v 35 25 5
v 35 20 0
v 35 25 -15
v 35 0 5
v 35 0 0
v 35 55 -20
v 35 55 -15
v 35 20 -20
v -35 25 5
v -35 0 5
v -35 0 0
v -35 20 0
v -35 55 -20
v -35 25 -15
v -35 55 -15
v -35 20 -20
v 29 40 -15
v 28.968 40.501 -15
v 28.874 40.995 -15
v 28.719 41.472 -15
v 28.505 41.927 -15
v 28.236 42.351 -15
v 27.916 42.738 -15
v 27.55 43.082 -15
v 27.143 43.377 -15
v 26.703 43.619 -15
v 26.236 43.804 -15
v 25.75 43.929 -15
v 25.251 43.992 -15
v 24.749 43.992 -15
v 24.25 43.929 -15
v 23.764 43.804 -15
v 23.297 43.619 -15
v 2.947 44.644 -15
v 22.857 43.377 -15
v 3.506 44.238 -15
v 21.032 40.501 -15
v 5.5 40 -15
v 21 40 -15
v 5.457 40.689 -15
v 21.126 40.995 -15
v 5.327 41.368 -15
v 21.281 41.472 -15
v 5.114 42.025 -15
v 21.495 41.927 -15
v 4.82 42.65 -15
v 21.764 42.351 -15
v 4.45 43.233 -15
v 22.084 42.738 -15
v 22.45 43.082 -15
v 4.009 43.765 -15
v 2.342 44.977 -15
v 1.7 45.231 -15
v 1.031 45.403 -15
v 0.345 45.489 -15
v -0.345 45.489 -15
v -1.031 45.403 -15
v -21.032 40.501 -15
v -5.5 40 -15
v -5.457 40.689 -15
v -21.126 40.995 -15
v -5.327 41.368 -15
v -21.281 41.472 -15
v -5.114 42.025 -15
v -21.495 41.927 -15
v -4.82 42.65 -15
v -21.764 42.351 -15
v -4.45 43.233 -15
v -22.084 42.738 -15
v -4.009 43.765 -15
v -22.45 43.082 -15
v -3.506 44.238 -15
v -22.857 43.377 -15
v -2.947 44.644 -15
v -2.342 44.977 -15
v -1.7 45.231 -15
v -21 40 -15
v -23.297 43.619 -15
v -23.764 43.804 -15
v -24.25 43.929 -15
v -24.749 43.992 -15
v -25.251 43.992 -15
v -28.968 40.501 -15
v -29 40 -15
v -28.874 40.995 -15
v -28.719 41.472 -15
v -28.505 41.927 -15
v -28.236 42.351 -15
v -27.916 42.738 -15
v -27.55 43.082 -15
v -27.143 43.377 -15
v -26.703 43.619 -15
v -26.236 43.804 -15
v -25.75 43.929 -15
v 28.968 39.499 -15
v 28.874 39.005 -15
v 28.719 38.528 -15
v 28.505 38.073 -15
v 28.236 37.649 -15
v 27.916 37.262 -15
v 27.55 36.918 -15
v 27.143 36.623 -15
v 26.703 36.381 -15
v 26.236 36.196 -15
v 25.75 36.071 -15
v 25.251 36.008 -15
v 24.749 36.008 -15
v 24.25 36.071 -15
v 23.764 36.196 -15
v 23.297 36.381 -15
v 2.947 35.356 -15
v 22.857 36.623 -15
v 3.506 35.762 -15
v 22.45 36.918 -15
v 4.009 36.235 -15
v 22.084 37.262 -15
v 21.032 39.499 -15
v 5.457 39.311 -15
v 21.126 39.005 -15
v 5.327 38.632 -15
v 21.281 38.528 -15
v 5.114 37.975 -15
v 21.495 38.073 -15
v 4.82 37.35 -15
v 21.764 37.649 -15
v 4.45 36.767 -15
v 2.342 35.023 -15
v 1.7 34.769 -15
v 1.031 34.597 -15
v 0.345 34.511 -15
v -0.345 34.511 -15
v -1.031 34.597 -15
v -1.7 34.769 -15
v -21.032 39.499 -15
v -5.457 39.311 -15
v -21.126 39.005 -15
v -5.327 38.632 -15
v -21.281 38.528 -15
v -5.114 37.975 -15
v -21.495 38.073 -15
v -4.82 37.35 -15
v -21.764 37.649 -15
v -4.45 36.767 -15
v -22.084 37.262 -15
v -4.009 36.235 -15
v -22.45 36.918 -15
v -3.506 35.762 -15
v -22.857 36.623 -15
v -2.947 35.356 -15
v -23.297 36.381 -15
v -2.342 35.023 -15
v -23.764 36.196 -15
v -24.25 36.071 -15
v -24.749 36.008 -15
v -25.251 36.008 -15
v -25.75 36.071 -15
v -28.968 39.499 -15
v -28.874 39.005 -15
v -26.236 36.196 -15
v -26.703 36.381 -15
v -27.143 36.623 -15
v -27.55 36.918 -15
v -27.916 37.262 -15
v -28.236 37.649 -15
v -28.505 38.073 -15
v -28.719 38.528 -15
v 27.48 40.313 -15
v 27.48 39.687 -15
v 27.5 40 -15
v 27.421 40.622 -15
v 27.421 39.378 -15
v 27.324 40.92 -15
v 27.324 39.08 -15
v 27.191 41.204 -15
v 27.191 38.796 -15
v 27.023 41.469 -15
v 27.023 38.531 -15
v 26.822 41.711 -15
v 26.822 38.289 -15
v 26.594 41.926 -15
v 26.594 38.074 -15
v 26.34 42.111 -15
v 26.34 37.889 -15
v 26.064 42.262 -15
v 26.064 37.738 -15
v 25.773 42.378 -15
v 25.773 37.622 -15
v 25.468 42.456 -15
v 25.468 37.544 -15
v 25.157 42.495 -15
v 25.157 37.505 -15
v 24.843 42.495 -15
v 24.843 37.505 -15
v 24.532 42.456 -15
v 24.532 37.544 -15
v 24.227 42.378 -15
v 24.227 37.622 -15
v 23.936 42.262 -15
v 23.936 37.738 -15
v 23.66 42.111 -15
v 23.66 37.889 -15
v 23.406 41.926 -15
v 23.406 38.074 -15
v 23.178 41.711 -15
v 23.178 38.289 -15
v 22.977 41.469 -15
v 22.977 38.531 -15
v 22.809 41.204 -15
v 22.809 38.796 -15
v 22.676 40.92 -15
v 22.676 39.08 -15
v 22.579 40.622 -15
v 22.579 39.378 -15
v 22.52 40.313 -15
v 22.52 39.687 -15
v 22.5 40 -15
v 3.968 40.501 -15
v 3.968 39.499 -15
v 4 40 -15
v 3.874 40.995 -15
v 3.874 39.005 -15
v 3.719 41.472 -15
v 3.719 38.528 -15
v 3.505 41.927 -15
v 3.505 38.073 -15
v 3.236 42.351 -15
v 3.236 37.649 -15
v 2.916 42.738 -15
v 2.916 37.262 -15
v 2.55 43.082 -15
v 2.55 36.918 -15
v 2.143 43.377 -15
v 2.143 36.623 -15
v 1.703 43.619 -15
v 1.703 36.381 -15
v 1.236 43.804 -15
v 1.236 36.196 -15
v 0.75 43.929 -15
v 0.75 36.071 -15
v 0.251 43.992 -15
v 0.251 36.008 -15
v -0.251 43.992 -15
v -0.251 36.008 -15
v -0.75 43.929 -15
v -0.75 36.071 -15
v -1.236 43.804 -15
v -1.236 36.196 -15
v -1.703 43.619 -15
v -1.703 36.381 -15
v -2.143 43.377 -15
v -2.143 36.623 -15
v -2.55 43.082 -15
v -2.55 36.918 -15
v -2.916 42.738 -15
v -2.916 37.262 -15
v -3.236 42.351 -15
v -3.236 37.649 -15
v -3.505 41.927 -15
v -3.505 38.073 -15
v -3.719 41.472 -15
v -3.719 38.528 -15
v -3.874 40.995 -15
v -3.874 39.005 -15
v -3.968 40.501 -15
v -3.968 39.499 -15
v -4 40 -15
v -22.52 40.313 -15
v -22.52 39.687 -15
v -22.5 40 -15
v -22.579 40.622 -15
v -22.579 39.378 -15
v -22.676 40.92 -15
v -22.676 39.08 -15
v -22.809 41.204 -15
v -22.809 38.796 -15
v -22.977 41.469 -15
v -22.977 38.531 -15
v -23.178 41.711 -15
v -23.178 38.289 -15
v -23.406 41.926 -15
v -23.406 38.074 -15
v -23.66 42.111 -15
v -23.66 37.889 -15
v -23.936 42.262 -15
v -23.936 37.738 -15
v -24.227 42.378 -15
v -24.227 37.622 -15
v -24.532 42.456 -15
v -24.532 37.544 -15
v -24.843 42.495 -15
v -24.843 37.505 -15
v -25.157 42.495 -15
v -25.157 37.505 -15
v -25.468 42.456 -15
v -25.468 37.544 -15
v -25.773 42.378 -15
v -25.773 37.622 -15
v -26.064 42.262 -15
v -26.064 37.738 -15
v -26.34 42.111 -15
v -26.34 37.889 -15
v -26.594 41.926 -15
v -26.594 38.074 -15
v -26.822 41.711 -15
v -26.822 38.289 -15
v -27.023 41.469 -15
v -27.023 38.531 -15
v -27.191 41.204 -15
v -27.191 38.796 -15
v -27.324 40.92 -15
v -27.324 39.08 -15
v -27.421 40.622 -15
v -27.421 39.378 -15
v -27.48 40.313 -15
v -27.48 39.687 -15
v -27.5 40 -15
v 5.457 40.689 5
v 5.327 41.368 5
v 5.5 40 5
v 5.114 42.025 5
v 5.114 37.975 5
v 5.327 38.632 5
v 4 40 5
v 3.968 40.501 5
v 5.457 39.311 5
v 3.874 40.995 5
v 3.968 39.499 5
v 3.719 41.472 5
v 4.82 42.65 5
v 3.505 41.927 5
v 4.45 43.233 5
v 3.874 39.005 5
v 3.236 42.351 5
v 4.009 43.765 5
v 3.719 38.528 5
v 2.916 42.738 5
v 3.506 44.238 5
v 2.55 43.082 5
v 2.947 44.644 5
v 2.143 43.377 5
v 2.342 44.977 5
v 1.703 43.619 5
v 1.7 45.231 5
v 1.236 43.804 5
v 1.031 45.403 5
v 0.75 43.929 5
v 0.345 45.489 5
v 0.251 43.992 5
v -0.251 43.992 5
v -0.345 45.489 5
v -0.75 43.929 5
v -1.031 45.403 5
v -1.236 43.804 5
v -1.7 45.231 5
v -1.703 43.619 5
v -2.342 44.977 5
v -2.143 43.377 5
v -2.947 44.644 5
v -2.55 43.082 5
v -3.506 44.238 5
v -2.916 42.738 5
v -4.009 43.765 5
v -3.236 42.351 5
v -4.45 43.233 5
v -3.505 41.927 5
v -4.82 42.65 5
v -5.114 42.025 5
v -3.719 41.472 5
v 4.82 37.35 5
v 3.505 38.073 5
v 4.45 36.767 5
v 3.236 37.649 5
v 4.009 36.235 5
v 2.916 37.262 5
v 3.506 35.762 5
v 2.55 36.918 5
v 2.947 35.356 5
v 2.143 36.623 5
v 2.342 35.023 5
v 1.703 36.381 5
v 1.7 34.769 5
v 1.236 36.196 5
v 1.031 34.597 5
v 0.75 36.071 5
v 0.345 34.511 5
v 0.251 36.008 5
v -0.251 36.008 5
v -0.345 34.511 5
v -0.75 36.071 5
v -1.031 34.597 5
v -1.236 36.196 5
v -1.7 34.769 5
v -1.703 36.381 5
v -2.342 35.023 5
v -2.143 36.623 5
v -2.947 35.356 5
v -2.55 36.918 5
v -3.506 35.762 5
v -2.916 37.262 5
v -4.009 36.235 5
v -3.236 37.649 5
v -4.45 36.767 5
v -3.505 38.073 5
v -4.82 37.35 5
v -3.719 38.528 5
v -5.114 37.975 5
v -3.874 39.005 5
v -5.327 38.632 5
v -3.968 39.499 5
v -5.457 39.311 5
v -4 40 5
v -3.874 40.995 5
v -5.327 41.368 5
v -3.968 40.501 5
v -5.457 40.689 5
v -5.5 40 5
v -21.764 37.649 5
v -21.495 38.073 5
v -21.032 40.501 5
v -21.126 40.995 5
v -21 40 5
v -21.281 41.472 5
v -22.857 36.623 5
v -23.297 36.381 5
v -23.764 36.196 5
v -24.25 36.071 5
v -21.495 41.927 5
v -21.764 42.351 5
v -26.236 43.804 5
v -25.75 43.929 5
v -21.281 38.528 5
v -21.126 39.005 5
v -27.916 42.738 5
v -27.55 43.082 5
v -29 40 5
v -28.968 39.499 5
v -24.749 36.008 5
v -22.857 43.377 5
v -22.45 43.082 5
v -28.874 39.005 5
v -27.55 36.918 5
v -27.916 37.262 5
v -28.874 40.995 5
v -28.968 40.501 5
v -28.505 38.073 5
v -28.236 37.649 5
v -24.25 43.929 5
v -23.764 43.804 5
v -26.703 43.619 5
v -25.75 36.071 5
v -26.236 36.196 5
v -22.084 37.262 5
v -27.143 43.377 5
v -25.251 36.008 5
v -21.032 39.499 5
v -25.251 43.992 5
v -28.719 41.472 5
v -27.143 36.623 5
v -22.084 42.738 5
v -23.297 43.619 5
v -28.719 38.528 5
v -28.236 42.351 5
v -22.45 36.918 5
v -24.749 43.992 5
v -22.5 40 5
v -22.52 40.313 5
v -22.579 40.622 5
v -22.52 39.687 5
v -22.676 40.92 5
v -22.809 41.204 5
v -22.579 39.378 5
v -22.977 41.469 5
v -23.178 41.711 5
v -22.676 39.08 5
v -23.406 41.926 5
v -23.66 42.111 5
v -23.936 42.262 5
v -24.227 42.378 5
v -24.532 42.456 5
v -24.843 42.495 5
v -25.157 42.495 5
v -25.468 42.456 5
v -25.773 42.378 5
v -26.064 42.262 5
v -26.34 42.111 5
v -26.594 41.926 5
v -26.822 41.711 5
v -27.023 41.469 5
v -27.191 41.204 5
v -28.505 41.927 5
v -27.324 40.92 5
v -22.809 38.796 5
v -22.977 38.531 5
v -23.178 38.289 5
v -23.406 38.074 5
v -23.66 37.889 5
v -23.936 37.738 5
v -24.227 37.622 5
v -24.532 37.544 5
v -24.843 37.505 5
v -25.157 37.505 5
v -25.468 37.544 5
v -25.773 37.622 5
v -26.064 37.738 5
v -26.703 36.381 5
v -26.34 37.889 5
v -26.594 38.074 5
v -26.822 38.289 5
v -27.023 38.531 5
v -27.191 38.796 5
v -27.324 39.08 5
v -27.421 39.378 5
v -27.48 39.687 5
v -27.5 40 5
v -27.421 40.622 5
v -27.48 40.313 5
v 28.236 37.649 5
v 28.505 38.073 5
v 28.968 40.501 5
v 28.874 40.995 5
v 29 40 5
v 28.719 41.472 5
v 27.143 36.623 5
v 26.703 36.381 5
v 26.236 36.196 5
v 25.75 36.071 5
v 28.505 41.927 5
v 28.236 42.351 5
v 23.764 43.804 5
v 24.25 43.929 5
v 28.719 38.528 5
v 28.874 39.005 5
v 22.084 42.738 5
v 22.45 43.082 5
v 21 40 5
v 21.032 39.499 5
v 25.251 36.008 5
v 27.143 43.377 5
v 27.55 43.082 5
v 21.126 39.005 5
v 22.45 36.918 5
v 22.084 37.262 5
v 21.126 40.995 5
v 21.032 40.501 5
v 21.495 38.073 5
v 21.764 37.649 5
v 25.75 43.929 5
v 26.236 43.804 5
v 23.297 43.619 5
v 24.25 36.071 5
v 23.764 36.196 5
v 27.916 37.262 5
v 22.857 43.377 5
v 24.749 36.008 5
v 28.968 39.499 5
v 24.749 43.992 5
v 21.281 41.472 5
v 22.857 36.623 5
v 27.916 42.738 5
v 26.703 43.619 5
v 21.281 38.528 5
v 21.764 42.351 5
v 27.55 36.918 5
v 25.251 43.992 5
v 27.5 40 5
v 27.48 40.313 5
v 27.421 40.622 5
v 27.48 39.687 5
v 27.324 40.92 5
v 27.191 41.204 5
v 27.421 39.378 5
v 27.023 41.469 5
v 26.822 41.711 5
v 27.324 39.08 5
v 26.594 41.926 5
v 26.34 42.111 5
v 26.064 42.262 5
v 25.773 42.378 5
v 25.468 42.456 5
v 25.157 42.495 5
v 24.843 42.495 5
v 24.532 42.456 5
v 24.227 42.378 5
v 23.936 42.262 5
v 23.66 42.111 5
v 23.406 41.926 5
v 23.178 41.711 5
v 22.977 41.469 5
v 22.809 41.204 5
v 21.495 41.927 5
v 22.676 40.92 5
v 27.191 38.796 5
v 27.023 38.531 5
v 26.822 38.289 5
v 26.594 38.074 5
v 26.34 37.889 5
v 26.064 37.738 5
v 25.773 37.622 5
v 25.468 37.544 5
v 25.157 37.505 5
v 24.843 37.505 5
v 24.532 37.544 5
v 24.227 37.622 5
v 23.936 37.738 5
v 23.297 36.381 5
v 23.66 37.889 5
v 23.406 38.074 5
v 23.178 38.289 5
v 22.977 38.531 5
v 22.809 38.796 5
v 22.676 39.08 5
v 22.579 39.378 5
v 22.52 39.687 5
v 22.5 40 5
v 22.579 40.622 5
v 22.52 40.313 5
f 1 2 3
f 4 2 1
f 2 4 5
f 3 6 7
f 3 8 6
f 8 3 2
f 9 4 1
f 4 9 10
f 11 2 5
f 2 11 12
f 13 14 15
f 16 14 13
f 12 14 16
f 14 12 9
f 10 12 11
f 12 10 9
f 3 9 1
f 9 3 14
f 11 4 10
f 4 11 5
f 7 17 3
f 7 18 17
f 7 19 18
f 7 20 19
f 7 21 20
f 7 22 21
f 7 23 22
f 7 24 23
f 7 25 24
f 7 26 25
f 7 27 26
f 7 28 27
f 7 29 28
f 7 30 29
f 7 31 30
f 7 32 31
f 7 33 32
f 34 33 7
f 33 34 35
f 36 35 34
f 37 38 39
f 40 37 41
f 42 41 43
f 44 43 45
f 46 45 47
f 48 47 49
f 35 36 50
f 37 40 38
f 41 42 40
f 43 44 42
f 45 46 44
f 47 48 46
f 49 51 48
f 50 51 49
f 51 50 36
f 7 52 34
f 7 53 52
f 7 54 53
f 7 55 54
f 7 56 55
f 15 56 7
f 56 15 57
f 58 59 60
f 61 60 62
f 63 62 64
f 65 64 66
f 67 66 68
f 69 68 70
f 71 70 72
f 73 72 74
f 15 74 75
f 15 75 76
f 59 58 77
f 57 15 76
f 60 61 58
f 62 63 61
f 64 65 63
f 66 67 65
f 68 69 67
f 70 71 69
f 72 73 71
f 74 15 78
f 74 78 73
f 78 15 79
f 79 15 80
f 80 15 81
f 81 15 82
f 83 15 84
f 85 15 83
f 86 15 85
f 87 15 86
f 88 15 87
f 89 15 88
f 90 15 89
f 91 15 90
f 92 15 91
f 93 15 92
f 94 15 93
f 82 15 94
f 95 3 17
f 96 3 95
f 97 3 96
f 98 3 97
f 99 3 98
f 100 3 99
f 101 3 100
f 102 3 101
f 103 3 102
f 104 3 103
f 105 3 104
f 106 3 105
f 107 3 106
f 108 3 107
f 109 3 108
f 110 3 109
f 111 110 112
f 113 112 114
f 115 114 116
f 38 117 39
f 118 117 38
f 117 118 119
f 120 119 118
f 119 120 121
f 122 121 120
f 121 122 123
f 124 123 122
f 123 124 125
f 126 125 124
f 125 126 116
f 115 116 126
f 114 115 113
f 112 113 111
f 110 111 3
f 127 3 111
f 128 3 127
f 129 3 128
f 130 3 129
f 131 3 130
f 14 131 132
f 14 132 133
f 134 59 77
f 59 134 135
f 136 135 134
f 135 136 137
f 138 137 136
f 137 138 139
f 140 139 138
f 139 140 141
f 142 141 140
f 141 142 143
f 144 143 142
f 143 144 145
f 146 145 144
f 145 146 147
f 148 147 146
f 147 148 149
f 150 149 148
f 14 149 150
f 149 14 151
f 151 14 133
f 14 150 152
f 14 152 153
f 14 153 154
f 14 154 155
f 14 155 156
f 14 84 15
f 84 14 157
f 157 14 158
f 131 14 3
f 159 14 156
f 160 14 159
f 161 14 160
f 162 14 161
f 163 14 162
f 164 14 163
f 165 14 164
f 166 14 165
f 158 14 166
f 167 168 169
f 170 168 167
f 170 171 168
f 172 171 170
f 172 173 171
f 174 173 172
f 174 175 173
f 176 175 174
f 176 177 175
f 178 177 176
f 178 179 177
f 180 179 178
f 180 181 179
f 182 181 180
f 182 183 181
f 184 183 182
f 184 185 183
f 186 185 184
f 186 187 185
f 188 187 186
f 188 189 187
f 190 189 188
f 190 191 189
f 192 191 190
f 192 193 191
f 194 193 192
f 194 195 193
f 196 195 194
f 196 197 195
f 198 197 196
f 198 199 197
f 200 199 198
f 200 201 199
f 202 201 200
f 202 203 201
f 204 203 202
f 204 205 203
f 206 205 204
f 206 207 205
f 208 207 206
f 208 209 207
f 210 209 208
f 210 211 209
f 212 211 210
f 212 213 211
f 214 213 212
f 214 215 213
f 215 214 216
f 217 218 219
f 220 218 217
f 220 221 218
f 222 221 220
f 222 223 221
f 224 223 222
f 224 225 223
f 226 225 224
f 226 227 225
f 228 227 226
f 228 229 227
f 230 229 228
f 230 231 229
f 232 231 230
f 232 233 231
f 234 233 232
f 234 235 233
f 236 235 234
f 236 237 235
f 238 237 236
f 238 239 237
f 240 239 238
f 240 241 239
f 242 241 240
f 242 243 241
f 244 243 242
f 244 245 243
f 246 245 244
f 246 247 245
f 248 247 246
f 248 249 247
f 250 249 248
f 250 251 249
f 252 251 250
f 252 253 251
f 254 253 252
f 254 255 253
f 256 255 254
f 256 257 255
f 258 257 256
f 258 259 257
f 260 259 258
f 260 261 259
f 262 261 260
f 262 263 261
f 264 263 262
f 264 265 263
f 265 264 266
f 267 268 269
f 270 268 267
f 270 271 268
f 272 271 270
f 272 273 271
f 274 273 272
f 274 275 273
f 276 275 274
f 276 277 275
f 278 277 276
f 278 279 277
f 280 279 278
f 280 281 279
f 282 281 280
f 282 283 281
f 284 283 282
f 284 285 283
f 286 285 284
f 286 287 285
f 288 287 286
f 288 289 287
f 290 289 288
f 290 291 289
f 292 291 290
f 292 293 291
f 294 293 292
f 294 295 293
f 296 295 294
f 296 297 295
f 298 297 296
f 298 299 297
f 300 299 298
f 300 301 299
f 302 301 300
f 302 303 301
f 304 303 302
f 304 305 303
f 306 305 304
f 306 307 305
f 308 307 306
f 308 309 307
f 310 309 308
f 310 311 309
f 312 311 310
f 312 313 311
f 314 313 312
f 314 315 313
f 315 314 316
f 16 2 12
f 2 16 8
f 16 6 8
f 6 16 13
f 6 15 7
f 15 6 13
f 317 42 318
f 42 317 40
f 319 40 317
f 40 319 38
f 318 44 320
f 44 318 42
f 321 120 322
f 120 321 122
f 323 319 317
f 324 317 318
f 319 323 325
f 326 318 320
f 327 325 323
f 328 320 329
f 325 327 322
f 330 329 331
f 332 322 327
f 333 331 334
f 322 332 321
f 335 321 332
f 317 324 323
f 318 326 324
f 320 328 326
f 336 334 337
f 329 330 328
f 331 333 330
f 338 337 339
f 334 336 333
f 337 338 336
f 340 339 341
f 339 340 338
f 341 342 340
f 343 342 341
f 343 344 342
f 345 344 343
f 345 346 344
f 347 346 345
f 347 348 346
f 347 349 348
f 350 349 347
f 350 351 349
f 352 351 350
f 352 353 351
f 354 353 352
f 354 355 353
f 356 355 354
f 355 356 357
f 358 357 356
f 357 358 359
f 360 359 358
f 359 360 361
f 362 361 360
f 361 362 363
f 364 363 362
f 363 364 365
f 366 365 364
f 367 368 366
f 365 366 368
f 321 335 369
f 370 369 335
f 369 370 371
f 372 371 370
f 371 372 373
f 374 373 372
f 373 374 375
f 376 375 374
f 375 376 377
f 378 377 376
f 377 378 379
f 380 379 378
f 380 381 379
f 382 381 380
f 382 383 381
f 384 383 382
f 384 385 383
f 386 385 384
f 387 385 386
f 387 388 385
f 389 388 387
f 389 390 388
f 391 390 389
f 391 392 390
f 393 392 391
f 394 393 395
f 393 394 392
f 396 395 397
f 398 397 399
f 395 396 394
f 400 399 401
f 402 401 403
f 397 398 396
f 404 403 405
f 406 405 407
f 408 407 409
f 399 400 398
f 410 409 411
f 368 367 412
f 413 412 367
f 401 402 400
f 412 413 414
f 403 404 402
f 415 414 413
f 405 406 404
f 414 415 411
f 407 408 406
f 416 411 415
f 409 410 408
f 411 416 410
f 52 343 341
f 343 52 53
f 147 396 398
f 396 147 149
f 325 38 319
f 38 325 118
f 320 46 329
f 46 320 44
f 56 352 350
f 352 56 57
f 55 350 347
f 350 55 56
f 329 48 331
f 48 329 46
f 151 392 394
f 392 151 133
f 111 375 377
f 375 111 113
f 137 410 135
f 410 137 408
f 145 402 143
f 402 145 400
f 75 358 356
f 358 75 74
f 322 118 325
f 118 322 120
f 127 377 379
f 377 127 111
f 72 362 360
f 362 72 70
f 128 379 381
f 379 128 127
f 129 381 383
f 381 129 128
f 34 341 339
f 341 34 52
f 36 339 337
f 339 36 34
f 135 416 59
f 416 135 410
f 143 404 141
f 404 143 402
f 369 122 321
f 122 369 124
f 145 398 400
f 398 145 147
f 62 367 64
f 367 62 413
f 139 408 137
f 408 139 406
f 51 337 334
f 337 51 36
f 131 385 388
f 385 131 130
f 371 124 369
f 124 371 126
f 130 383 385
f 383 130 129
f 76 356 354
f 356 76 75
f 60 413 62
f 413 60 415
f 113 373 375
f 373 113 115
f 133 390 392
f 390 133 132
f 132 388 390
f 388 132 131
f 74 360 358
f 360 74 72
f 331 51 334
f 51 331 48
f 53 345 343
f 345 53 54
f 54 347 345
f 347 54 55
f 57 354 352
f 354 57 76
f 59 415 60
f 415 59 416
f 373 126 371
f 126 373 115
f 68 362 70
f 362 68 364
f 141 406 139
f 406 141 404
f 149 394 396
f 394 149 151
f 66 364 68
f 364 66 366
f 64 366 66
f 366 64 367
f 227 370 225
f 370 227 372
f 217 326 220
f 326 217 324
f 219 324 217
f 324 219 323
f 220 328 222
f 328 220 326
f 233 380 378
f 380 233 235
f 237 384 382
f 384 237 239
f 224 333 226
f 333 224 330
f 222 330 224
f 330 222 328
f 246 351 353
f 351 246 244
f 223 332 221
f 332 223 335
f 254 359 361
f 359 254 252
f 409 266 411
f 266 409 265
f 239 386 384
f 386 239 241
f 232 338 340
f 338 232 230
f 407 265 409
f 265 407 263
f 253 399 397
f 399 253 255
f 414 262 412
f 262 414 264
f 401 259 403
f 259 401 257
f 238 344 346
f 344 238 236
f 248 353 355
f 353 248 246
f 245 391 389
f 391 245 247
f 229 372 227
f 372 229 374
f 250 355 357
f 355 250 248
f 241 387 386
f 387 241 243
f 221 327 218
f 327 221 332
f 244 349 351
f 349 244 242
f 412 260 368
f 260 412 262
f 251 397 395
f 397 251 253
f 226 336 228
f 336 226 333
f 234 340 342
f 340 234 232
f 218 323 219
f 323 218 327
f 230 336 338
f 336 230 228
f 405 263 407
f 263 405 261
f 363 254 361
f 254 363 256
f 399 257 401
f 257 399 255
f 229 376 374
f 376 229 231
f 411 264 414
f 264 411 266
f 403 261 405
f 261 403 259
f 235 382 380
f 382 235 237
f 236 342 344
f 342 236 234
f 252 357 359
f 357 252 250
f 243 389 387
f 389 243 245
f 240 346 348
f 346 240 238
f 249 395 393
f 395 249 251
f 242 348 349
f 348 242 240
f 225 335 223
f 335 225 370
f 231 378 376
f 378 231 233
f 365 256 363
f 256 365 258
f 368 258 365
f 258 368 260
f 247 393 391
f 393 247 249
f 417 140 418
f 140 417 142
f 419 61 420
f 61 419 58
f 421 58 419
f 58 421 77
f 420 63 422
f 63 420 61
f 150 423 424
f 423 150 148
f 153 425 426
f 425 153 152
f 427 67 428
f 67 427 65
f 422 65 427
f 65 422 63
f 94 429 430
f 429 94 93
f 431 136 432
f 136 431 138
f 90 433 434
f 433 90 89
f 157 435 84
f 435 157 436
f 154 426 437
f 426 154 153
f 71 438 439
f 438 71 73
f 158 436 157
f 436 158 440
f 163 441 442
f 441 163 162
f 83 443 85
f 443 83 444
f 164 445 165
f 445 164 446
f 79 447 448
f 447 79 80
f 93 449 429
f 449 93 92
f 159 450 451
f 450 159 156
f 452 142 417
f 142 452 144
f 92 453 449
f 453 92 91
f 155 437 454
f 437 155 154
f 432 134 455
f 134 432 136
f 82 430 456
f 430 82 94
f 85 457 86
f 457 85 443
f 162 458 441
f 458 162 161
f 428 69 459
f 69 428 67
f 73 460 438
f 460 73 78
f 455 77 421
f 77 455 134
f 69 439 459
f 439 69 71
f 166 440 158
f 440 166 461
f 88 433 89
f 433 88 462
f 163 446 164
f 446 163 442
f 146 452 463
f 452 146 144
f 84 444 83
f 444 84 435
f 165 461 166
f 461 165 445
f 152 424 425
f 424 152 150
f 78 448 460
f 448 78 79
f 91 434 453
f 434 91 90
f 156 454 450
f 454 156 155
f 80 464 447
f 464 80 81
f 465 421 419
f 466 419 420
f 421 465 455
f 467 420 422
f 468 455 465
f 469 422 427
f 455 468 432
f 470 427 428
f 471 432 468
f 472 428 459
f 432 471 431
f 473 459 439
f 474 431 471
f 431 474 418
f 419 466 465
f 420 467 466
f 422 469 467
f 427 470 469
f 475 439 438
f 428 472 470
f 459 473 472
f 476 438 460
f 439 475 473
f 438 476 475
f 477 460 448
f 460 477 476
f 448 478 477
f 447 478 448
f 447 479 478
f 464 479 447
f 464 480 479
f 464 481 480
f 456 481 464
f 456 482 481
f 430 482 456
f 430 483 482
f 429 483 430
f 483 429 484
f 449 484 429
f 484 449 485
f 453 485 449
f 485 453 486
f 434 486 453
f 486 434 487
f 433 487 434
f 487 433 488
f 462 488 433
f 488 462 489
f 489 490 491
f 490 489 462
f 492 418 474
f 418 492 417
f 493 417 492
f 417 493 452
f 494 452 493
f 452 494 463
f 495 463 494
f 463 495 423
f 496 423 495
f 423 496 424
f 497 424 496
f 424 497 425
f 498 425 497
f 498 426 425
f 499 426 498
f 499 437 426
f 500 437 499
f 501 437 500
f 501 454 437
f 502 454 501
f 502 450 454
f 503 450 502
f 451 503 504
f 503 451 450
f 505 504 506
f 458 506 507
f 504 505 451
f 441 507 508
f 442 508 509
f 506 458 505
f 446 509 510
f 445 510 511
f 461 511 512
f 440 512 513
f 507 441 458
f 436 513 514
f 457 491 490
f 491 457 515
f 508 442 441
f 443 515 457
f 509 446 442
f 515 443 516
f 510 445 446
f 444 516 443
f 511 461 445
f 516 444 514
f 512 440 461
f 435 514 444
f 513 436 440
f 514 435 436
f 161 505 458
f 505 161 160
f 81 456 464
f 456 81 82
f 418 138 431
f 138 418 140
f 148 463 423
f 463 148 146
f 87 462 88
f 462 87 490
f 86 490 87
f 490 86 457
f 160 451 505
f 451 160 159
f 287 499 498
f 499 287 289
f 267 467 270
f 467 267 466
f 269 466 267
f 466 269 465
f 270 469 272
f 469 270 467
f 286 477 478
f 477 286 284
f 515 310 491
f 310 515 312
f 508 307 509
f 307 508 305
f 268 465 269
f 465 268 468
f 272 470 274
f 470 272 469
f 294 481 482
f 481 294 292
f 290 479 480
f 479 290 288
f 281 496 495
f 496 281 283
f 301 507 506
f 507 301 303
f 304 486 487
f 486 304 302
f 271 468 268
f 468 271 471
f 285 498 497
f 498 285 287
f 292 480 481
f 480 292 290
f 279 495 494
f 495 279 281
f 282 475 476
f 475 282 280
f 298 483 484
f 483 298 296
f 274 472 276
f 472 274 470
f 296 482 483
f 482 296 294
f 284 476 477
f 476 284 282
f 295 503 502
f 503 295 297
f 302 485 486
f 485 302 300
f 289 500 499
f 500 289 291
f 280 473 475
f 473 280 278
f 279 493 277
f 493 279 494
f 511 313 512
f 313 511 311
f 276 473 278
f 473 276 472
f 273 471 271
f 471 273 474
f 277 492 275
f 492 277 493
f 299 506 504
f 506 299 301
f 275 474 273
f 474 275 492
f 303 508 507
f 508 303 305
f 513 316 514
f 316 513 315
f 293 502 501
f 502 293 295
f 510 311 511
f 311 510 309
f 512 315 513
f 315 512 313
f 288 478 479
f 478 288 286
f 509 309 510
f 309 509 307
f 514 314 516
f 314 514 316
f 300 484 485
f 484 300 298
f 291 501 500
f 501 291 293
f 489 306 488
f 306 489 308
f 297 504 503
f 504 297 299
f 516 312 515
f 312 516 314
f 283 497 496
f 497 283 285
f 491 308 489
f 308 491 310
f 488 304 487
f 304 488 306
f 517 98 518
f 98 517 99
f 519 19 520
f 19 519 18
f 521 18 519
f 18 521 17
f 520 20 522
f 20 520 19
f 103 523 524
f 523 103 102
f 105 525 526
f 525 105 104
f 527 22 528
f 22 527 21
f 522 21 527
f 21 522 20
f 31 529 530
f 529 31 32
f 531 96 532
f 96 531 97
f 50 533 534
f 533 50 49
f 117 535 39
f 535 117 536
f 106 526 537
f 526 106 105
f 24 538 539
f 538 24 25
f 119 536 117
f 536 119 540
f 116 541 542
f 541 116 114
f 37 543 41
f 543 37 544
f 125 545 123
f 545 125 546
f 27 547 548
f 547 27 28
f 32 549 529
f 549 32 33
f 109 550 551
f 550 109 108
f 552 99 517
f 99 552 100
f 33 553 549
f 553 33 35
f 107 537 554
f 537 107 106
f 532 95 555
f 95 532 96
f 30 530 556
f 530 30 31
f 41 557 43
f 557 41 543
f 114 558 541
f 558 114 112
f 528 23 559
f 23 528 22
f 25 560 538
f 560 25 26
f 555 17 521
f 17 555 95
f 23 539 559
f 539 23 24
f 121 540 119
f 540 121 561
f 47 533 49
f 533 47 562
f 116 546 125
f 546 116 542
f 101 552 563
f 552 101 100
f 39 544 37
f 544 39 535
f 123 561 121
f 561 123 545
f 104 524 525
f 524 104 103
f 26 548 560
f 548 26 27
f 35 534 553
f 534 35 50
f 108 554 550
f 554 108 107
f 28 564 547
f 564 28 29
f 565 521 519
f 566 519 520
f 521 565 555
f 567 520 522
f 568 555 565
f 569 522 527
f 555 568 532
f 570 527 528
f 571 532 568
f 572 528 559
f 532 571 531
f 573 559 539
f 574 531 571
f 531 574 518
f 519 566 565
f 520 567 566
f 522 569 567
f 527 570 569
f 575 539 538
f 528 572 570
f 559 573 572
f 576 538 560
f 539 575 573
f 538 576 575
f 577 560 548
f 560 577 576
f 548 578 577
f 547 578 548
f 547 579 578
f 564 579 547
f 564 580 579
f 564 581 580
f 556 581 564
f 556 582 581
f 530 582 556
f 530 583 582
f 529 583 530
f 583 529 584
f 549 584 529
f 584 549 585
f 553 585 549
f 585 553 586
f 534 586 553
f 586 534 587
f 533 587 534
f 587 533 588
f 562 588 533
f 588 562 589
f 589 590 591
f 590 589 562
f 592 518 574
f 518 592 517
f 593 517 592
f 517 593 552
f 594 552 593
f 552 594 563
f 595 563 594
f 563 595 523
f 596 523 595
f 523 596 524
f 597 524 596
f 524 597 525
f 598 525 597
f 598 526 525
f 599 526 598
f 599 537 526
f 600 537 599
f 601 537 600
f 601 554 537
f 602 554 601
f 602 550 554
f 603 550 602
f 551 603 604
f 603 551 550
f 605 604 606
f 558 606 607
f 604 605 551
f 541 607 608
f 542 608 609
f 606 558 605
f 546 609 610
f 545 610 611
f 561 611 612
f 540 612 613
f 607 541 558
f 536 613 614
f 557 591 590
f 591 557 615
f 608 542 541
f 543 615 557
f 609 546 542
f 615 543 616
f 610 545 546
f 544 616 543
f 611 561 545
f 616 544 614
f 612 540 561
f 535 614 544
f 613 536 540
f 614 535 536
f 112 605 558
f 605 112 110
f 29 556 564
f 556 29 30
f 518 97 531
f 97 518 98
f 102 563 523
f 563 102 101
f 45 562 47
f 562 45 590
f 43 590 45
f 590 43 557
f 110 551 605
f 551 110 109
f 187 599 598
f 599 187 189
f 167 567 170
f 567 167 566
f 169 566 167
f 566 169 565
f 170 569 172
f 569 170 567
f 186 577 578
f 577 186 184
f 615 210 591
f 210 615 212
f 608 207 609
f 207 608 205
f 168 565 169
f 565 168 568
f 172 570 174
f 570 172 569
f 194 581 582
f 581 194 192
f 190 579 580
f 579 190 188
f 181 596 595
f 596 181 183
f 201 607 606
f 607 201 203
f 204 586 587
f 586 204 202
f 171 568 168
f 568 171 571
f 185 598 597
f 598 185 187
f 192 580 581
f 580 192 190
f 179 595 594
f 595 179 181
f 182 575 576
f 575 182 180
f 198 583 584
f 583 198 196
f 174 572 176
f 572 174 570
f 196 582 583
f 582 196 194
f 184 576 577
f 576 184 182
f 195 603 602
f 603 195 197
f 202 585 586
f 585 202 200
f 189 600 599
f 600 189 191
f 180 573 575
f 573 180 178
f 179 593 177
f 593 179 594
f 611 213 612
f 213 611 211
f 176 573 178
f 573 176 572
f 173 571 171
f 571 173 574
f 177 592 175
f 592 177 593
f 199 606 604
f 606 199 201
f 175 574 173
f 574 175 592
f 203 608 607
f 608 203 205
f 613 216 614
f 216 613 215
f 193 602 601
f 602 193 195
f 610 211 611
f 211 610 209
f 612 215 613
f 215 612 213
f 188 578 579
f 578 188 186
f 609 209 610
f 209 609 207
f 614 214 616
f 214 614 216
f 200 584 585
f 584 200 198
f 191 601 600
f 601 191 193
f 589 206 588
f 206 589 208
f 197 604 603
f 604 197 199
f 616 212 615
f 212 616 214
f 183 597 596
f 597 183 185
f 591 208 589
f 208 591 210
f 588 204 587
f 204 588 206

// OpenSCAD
// file: Config.scad
/***********************************/
/*                                 */
/* Configuration                   */
/*                                 */
/***********************************/

/* [Axe des trous] */
// Ecart par rapport a la face avant
ecartAxe = 40;
// Ecart entre le trou filete et les deux trous lisses
ecartTrous = 25;

/* [Trou filete] */
// Diametre du trou filete
fileteDM = 8;
// Profondeur du trou filete
filetePF = 20;

/* [Trou lisses] */
// Diametre des trous lisses
lissesDM = 5;
// Profondeur des trous lisses
lissesPF = 20;

/* [Dimensions du rebort] */
// Hauteur du rebort
rebortHT = 10;
// Epaisseur du rebort
rebortEP = 20;

/* [Dimensions des cylindres] */
// Hauteur des cylindres
cylindresHT = 20;
// Epaisseur des cylindres
cylindresEP = 3;

fudge = 0.1;
$fn = 50;

module cylindre(diametreInt, ep, ht)
{
    translate([0,0, ht/2])
    difference ()
    {
        cylinder(d=diametreInt+ep, h=ht, center=true);
        
        cylinder(d=diametreInt, h=ht+2*fudge, center=true);
    }
}

// cylindre(fileteDM, cylindresEP, cylindresHT);
// main file
/***********************************/
/*                                 */
/* Support du bas                  */
/*                                 */
/***********************************/

include <Config.scad>

/* [Dimensions du support] */
// Hauteur du support
supportHT = 30;
// Longueur du support
supportLG = 70;
// Epaisseur du support
supportEP = 5;
// Largeur plateforme
plateLG = 30;

module supportBas()
{
    
    union ()
    {
        // Support
        color("gold")
        {
            // Accroche sur le rebort
            translate([-supportLG/2,0,0])
            cube([supportLG,rebortEP+supportEP,supportEP]);
            
            // Montant
            translate([-supportLG/2,rebortEP,-cylindresHT+supportEP])
            cube([supportLG,supportEP, cylindresHT-supportEP]);
            
            // Plate-forme
            translate([-supportLG/2,rebortEP,-cylindresHT])
            cube([supportLG, supportEP+plateLG, supportEP]);
        }
        
        // Trous
        color("red")
        {
            // Cylindre filete
            translate([0,ecartAxe, -cylindresHT+supportEP])
            cylindre(fileteDM, cylindresEP, cylindresHT);
            
            // Cylindre lisses minusX
            translate([-ecartTrous, ecartAxe, -cylindresHT+supportEP])
            cylindre(lissesDM, cylindresEP, cylindresHT);
            
            // Cylindre lisses plusX
            translate([ecartTrous, ecartAxe, -cylindresHT+supportEP])
            cylindre(lissesDM, cylindresEP, cylindresHT);
        }
        
        // Renforts pour les trous
        color("blue")
        {
            
        }
    }    
//    translate([-supportLG/2,0,0])
//    difference ()
//    {
//        // Support principal
//        cube([supportLG, supportEP, supportHT]);
//        
//        // Rebort
//        translate([-fudge,-fudge,-fudge])
//        cube([supportLG+2*fudge, rebortEP+fudge, rebortHT+fudge]);
//        
//        translate([supportLG/2,ecartAxe,supportHT])
//        {
//            // Trou filete
//            #color("red")
//            translate([0,0,-filetePF/2])
//            cylinder(d=fileteDM, h=filetePF+fudge, center=true);
//            
//            // Trou lisse de gauche
//            #color("green")
//            translate([-ecartTrous, 0, -lissesPF/2])
//            cylinder(d=lissesDM, h=lissesPF+fudge, center=true);
//            
//            // Trou lisse de droite
//            #color("blue")
//            translate([ecartTrous, 0, -lissesPF/2])
//            cylinder(d=lissesDM, h=lissesPF+fudge, center=true);
//        }
//    }
}

supportBas();
